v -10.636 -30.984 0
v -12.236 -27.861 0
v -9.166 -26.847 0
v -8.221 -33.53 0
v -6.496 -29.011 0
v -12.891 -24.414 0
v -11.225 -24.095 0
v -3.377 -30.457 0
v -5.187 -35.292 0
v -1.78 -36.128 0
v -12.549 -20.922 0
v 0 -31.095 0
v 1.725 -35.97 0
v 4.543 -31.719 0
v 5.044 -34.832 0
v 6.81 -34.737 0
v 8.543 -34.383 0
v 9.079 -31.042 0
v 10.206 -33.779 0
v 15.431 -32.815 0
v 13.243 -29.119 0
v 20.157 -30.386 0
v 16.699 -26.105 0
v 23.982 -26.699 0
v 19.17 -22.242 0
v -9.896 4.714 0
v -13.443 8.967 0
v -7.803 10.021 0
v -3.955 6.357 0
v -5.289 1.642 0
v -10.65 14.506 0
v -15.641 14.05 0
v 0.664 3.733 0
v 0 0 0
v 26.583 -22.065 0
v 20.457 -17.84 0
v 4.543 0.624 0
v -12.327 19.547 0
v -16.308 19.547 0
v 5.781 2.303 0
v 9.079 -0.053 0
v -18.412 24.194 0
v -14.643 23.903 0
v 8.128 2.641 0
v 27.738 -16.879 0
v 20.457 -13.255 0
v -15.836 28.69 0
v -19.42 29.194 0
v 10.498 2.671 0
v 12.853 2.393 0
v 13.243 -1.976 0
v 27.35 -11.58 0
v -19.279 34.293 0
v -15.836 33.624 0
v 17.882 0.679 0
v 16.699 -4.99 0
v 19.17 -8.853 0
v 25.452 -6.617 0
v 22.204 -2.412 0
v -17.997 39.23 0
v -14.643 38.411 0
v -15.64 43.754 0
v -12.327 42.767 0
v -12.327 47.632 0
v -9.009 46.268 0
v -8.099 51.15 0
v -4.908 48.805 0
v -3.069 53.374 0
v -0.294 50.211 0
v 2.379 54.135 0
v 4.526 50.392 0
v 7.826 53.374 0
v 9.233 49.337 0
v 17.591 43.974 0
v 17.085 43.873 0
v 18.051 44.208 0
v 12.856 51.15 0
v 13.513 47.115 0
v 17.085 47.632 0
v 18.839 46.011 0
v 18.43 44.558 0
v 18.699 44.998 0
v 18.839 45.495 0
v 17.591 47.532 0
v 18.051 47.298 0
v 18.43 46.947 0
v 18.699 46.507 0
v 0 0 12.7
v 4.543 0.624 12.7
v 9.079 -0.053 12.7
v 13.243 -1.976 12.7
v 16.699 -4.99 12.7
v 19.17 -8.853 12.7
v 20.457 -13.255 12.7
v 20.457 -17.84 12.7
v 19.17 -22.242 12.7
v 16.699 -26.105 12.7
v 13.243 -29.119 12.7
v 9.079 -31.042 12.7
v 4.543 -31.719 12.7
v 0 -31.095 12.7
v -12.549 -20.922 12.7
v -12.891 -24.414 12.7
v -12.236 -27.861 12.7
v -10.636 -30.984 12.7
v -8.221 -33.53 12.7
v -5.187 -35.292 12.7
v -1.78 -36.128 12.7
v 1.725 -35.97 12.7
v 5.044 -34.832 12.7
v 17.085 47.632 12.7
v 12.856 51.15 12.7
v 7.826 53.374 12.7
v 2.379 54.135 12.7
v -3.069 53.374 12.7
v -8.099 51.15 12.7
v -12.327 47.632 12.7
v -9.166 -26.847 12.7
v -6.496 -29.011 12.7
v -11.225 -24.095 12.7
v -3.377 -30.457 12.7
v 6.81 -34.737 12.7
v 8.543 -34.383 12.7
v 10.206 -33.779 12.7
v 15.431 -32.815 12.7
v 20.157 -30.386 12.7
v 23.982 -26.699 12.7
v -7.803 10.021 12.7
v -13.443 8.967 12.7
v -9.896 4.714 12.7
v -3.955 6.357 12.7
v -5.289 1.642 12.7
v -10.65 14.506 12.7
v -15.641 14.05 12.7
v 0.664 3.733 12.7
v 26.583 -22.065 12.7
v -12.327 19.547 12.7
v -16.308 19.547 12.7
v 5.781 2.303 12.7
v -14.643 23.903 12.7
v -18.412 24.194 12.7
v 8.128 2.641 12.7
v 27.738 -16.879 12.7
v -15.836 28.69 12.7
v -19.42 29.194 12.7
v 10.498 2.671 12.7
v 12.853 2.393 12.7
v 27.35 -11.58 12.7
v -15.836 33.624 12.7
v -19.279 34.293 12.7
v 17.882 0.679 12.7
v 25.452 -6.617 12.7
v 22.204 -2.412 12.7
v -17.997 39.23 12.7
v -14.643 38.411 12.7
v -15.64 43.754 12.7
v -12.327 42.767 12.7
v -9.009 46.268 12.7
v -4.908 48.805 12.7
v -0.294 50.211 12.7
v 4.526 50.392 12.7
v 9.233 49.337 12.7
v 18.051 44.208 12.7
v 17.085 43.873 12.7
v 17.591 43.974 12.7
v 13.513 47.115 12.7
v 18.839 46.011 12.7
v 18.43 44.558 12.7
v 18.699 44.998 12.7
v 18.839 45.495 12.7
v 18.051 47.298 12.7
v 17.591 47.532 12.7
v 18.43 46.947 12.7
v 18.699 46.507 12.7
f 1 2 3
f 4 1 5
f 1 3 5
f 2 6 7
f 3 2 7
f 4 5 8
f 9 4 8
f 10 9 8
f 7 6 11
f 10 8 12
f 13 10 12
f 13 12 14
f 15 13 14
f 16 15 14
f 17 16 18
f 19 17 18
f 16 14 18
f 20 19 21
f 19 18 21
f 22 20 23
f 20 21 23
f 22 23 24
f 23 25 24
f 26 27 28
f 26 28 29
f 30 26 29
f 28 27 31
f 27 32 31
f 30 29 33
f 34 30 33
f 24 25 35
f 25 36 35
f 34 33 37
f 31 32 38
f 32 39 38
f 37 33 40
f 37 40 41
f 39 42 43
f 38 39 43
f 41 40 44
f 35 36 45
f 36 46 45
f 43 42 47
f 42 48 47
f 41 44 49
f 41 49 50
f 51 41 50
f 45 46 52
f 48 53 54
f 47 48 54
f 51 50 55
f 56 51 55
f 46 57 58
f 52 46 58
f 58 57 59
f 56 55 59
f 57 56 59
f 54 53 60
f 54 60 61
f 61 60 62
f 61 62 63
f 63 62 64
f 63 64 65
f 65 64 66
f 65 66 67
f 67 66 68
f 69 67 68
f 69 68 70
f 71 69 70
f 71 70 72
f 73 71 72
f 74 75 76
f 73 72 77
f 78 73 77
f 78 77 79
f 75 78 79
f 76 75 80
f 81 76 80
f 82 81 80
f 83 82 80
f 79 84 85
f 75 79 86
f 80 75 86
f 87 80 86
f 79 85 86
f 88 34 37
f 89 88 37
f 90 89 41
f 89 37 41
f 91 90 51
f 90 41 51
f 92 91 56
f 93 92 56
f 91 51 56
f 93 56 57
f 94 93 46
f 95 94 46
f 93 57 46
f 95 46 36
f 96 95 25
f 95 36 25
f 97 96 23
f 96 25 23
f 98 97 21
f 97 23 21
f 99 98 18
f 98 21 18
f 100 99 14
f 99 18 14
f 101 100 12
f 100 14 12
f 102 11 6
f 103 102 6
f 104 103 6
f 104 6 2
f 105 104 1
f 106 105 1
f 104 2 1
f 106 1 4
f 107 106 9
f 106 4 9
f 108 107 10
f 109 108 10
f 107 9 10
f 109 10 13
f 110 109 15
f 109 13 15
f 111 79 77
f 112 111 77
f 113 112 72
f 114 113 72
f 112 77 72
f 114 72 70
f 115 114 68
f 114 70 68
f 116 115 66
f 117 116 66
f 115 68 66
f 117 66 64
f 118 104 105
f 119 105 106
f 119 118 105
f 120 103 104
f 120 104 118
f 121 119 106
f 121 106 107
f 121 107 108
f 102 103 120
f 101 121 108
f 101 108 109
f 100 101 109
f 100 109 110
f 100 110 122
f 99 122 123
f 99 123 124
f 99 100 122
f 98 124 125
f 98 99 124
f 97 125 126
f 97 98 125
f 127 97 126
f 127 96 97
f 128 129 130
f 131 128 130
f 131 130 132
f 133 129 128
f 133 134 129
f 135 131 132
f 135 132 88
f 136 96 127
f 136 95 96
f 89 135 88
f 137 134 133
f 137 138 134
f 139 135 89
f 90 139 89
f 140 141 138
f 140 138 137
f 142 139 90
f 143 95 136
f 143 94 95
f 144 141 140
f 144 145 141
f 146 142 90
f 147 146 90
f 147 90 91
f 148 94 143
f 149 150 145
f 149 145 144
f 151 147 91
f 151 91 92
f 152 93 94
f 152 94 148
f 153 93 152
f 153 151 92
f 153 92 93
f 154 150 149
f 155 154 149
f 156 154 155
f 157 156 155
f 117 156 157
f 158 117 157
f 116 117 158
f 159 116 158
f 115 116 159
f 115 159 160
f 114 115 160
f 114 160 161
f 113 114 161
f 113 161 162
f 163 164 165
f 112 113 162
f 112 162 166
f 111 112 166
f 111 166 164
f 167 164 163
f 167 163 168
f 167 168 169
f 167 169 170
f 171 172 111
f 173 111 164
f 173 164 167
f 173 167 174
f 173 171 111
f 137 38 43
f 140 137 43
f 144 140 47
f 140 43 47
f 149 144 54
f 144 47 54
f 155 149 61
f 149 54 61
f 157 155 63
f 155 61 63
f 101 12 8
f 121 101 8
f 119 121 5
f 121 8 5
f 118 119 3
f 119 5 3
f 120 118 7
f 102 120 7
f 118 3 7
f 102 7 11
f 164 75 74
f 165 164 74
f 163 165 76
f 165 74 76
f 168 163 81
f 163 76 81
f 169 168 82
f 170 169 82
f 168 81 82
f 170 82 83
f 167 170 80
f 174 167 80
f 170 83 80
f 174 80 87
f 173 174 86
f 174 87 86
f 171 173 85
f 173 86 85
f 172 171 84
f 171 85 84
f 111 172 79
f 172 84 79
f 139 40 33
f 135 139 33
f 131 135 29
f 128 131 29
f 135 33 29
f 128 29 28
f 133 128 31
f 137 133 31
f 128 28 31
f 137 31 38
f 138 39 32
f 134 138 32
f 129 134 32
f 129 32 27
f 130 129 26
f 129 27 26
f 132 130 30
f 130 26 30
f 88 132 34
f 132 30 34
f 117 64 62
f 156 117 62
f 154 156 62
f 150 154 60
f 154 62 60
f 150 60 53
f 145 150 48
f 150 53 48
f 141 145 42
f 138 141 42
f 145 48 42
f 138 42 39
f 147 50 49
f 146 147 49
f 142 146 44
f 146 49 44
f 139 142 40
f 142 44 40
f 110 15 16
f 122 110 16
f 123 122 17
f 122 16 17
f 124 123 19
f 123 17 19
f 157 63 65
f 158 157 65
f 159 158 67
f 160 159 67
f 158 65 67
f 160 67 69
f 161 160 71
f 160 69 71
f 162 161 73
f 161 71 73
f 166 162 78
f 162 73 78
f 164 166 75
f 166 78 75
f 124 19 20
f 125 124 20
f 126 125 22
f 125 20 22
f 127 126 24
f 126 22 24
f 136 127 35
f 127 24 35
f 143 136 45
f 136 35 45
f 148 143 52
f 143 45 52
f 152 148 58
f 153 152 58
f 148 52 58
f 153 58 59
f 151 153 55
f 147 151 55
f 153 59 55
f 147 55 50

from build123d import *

# Parameters (mm, degrees)
F1_DEPTH = 12.7


with BuildPart() as f1:
    # F0 (on Top) → F1 (new body)
    with BuildSketch(Plane.XY):
        with BuildLine():
            ThreePointArc((6.969989, -33.608161), (3.356066, -32.709161), (0, -31.095017))
            ThreePointArc((0, -31.095017), (-7.898027, -28.011691), (-12.548544, -20.922374))
            ThreePointArc((-12.548544, -20.922374), (-8.221346, -33.529552), (5.044016, -34.831756))
            ThreePointArc((5.044016, -34.831756), (6.035373, -34.264614), (6.969989, -33.608161))
        make_face()
        with BuildLine():
            ThreePointArc((0, 0), (20.620834, -15.547508), (0, -31.095017))
            ThreePointArc((0, -31.095017), (3.356066, -32.709161), (6.969989, -33.608161))
            ThreePointArc((6.969989, -33.608161), (8.584093, -33.765391), (10.205782, -33.778654))
            ThreePointArc((10.205782, -33.778654), (27.738488, -16.878906), (12.85268, 2.393092))
            ThreePointArc((12.85268, 2.393092), (9.320558, 2.059582), (5.78111, 2.303358))
            ThreePointArc((5.78111, 2.303358), (2.791616, 1.400004), (0, 0))
        make_face()
        with BuildLine():
            ThreePointArc((-16.308, 19.54706), (-11.822589, 6.712847), (0, 0))
            ThreePointArc((0, 0), (2.791616, 1.400004), (5.78111, 2.303358))
            ThreePointArc((5.78111, 2.303358), (-5.99092, 8.071132), (-12.327401, 19.54706))
            ThreePointArc((-12.327401, 19.54706), (-15.987157, 31.157143), (-12.327401, 42.767227))
            ThreePointArc((-12.327401, 42.767227), (2.110379, 50.457564), (17.084811, 43.872949))
            ThreePointArc((17.084811, 43.872949), (18.857216, 45.752674), (17.084811, 47.6324))
            ThreePointArc((17.084811, 47.6324), (2.378705, 54.134652), (-12.327401, 47.6324))
            ThreePointArc((-12.327401, 47.6324), (-19.279128, 34.292925), (-16.308, 19.54706))
        make_face()
        with BuildLine():
            ThreePointArc((10.205782, -33.778654), (8.584093, -33.765391), (6.969989, -33.608161))
            ThreePointArc((6.969989, -33.608161), (6.035373, -34.264614), (5.044016, -34.831756))
            ThreePointArc((5.044016, -34.831756), (7.683397, -34.591928), (10.205782, -33.778654))
        make_face()
        with BuildLine():
            ThreePointArc((12.85268, 2.393092), (9.312505, 2.694176), (5.78111, 2.303358))
            ThreePointArc((5.78111, 2.303358), (9.320558, 2.059582), (12.85268, 2.393092))
        make_face()
    extrude(amount=F1_DEPTH)


solid = f1.part
